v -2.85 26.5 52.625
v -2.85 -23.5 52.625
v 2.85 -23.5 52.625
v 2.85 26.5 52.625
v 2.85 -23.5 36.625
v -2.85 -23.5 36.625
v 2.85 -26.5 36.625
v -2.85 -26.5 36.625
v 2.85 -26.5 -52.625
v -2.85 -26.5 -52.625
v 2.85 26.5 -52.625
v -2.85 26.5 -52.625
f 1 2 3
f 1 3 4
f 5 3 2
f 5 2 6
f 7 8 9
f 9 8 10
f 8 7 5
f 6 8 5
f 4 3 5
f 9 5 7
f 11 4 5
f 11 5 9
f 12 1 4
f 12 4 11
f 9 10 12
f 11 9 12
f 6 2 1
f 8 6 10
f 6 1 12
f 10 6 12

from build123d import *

# Parameters (mm, degrees)
BOSS_EXTRUDE1_DEPTH      = 2.85
BOSS_EXTRUDE1_DEPTH_BACK = 2.85
SKETCH1_W                = 105.25
SKETCH1_H                = 53
SKETCH2_W                = 16
SKETCH2_H                = 3
CUT_EXTRUDE1_DEPTH       = 60.19569769


with BuildPart() as part:
    # Sketch1 → Boss-Extrude1 (new, two sides: drawn at the far end of the back side and taken through both)
    with BuildSketch(Plane(origin=(0, 0, 0), x_dir=(0, 0, -1), z_dir=(1, 0, 0)).offset(-BOSS_EXTRUDE1_DEPTH_BACK)):
        Rectangle(SKETCH1_W, SKETCH1_H)
    extrude(amount=BOSS_EXTRUDE1_DEPTH + BOSS_EXTRUDE1_DEPTH_BACK)

    # Sketch2 → Cut-Extrude1 (cut, through all)
    with BuildSketch(Plane(origin=(2.85, 0, 0), x_dir=(0, 0, -1), z_dir=(1, 0, 0))):
        with Locations((-44.625, -25)):
            Rectangle(SKETCH2_W, SKETCH2_H)
    extrude(amount=-CUT_EXTRUDE1_DEPTH, mode=Mode.SUBTRACT)


solid = part.part
